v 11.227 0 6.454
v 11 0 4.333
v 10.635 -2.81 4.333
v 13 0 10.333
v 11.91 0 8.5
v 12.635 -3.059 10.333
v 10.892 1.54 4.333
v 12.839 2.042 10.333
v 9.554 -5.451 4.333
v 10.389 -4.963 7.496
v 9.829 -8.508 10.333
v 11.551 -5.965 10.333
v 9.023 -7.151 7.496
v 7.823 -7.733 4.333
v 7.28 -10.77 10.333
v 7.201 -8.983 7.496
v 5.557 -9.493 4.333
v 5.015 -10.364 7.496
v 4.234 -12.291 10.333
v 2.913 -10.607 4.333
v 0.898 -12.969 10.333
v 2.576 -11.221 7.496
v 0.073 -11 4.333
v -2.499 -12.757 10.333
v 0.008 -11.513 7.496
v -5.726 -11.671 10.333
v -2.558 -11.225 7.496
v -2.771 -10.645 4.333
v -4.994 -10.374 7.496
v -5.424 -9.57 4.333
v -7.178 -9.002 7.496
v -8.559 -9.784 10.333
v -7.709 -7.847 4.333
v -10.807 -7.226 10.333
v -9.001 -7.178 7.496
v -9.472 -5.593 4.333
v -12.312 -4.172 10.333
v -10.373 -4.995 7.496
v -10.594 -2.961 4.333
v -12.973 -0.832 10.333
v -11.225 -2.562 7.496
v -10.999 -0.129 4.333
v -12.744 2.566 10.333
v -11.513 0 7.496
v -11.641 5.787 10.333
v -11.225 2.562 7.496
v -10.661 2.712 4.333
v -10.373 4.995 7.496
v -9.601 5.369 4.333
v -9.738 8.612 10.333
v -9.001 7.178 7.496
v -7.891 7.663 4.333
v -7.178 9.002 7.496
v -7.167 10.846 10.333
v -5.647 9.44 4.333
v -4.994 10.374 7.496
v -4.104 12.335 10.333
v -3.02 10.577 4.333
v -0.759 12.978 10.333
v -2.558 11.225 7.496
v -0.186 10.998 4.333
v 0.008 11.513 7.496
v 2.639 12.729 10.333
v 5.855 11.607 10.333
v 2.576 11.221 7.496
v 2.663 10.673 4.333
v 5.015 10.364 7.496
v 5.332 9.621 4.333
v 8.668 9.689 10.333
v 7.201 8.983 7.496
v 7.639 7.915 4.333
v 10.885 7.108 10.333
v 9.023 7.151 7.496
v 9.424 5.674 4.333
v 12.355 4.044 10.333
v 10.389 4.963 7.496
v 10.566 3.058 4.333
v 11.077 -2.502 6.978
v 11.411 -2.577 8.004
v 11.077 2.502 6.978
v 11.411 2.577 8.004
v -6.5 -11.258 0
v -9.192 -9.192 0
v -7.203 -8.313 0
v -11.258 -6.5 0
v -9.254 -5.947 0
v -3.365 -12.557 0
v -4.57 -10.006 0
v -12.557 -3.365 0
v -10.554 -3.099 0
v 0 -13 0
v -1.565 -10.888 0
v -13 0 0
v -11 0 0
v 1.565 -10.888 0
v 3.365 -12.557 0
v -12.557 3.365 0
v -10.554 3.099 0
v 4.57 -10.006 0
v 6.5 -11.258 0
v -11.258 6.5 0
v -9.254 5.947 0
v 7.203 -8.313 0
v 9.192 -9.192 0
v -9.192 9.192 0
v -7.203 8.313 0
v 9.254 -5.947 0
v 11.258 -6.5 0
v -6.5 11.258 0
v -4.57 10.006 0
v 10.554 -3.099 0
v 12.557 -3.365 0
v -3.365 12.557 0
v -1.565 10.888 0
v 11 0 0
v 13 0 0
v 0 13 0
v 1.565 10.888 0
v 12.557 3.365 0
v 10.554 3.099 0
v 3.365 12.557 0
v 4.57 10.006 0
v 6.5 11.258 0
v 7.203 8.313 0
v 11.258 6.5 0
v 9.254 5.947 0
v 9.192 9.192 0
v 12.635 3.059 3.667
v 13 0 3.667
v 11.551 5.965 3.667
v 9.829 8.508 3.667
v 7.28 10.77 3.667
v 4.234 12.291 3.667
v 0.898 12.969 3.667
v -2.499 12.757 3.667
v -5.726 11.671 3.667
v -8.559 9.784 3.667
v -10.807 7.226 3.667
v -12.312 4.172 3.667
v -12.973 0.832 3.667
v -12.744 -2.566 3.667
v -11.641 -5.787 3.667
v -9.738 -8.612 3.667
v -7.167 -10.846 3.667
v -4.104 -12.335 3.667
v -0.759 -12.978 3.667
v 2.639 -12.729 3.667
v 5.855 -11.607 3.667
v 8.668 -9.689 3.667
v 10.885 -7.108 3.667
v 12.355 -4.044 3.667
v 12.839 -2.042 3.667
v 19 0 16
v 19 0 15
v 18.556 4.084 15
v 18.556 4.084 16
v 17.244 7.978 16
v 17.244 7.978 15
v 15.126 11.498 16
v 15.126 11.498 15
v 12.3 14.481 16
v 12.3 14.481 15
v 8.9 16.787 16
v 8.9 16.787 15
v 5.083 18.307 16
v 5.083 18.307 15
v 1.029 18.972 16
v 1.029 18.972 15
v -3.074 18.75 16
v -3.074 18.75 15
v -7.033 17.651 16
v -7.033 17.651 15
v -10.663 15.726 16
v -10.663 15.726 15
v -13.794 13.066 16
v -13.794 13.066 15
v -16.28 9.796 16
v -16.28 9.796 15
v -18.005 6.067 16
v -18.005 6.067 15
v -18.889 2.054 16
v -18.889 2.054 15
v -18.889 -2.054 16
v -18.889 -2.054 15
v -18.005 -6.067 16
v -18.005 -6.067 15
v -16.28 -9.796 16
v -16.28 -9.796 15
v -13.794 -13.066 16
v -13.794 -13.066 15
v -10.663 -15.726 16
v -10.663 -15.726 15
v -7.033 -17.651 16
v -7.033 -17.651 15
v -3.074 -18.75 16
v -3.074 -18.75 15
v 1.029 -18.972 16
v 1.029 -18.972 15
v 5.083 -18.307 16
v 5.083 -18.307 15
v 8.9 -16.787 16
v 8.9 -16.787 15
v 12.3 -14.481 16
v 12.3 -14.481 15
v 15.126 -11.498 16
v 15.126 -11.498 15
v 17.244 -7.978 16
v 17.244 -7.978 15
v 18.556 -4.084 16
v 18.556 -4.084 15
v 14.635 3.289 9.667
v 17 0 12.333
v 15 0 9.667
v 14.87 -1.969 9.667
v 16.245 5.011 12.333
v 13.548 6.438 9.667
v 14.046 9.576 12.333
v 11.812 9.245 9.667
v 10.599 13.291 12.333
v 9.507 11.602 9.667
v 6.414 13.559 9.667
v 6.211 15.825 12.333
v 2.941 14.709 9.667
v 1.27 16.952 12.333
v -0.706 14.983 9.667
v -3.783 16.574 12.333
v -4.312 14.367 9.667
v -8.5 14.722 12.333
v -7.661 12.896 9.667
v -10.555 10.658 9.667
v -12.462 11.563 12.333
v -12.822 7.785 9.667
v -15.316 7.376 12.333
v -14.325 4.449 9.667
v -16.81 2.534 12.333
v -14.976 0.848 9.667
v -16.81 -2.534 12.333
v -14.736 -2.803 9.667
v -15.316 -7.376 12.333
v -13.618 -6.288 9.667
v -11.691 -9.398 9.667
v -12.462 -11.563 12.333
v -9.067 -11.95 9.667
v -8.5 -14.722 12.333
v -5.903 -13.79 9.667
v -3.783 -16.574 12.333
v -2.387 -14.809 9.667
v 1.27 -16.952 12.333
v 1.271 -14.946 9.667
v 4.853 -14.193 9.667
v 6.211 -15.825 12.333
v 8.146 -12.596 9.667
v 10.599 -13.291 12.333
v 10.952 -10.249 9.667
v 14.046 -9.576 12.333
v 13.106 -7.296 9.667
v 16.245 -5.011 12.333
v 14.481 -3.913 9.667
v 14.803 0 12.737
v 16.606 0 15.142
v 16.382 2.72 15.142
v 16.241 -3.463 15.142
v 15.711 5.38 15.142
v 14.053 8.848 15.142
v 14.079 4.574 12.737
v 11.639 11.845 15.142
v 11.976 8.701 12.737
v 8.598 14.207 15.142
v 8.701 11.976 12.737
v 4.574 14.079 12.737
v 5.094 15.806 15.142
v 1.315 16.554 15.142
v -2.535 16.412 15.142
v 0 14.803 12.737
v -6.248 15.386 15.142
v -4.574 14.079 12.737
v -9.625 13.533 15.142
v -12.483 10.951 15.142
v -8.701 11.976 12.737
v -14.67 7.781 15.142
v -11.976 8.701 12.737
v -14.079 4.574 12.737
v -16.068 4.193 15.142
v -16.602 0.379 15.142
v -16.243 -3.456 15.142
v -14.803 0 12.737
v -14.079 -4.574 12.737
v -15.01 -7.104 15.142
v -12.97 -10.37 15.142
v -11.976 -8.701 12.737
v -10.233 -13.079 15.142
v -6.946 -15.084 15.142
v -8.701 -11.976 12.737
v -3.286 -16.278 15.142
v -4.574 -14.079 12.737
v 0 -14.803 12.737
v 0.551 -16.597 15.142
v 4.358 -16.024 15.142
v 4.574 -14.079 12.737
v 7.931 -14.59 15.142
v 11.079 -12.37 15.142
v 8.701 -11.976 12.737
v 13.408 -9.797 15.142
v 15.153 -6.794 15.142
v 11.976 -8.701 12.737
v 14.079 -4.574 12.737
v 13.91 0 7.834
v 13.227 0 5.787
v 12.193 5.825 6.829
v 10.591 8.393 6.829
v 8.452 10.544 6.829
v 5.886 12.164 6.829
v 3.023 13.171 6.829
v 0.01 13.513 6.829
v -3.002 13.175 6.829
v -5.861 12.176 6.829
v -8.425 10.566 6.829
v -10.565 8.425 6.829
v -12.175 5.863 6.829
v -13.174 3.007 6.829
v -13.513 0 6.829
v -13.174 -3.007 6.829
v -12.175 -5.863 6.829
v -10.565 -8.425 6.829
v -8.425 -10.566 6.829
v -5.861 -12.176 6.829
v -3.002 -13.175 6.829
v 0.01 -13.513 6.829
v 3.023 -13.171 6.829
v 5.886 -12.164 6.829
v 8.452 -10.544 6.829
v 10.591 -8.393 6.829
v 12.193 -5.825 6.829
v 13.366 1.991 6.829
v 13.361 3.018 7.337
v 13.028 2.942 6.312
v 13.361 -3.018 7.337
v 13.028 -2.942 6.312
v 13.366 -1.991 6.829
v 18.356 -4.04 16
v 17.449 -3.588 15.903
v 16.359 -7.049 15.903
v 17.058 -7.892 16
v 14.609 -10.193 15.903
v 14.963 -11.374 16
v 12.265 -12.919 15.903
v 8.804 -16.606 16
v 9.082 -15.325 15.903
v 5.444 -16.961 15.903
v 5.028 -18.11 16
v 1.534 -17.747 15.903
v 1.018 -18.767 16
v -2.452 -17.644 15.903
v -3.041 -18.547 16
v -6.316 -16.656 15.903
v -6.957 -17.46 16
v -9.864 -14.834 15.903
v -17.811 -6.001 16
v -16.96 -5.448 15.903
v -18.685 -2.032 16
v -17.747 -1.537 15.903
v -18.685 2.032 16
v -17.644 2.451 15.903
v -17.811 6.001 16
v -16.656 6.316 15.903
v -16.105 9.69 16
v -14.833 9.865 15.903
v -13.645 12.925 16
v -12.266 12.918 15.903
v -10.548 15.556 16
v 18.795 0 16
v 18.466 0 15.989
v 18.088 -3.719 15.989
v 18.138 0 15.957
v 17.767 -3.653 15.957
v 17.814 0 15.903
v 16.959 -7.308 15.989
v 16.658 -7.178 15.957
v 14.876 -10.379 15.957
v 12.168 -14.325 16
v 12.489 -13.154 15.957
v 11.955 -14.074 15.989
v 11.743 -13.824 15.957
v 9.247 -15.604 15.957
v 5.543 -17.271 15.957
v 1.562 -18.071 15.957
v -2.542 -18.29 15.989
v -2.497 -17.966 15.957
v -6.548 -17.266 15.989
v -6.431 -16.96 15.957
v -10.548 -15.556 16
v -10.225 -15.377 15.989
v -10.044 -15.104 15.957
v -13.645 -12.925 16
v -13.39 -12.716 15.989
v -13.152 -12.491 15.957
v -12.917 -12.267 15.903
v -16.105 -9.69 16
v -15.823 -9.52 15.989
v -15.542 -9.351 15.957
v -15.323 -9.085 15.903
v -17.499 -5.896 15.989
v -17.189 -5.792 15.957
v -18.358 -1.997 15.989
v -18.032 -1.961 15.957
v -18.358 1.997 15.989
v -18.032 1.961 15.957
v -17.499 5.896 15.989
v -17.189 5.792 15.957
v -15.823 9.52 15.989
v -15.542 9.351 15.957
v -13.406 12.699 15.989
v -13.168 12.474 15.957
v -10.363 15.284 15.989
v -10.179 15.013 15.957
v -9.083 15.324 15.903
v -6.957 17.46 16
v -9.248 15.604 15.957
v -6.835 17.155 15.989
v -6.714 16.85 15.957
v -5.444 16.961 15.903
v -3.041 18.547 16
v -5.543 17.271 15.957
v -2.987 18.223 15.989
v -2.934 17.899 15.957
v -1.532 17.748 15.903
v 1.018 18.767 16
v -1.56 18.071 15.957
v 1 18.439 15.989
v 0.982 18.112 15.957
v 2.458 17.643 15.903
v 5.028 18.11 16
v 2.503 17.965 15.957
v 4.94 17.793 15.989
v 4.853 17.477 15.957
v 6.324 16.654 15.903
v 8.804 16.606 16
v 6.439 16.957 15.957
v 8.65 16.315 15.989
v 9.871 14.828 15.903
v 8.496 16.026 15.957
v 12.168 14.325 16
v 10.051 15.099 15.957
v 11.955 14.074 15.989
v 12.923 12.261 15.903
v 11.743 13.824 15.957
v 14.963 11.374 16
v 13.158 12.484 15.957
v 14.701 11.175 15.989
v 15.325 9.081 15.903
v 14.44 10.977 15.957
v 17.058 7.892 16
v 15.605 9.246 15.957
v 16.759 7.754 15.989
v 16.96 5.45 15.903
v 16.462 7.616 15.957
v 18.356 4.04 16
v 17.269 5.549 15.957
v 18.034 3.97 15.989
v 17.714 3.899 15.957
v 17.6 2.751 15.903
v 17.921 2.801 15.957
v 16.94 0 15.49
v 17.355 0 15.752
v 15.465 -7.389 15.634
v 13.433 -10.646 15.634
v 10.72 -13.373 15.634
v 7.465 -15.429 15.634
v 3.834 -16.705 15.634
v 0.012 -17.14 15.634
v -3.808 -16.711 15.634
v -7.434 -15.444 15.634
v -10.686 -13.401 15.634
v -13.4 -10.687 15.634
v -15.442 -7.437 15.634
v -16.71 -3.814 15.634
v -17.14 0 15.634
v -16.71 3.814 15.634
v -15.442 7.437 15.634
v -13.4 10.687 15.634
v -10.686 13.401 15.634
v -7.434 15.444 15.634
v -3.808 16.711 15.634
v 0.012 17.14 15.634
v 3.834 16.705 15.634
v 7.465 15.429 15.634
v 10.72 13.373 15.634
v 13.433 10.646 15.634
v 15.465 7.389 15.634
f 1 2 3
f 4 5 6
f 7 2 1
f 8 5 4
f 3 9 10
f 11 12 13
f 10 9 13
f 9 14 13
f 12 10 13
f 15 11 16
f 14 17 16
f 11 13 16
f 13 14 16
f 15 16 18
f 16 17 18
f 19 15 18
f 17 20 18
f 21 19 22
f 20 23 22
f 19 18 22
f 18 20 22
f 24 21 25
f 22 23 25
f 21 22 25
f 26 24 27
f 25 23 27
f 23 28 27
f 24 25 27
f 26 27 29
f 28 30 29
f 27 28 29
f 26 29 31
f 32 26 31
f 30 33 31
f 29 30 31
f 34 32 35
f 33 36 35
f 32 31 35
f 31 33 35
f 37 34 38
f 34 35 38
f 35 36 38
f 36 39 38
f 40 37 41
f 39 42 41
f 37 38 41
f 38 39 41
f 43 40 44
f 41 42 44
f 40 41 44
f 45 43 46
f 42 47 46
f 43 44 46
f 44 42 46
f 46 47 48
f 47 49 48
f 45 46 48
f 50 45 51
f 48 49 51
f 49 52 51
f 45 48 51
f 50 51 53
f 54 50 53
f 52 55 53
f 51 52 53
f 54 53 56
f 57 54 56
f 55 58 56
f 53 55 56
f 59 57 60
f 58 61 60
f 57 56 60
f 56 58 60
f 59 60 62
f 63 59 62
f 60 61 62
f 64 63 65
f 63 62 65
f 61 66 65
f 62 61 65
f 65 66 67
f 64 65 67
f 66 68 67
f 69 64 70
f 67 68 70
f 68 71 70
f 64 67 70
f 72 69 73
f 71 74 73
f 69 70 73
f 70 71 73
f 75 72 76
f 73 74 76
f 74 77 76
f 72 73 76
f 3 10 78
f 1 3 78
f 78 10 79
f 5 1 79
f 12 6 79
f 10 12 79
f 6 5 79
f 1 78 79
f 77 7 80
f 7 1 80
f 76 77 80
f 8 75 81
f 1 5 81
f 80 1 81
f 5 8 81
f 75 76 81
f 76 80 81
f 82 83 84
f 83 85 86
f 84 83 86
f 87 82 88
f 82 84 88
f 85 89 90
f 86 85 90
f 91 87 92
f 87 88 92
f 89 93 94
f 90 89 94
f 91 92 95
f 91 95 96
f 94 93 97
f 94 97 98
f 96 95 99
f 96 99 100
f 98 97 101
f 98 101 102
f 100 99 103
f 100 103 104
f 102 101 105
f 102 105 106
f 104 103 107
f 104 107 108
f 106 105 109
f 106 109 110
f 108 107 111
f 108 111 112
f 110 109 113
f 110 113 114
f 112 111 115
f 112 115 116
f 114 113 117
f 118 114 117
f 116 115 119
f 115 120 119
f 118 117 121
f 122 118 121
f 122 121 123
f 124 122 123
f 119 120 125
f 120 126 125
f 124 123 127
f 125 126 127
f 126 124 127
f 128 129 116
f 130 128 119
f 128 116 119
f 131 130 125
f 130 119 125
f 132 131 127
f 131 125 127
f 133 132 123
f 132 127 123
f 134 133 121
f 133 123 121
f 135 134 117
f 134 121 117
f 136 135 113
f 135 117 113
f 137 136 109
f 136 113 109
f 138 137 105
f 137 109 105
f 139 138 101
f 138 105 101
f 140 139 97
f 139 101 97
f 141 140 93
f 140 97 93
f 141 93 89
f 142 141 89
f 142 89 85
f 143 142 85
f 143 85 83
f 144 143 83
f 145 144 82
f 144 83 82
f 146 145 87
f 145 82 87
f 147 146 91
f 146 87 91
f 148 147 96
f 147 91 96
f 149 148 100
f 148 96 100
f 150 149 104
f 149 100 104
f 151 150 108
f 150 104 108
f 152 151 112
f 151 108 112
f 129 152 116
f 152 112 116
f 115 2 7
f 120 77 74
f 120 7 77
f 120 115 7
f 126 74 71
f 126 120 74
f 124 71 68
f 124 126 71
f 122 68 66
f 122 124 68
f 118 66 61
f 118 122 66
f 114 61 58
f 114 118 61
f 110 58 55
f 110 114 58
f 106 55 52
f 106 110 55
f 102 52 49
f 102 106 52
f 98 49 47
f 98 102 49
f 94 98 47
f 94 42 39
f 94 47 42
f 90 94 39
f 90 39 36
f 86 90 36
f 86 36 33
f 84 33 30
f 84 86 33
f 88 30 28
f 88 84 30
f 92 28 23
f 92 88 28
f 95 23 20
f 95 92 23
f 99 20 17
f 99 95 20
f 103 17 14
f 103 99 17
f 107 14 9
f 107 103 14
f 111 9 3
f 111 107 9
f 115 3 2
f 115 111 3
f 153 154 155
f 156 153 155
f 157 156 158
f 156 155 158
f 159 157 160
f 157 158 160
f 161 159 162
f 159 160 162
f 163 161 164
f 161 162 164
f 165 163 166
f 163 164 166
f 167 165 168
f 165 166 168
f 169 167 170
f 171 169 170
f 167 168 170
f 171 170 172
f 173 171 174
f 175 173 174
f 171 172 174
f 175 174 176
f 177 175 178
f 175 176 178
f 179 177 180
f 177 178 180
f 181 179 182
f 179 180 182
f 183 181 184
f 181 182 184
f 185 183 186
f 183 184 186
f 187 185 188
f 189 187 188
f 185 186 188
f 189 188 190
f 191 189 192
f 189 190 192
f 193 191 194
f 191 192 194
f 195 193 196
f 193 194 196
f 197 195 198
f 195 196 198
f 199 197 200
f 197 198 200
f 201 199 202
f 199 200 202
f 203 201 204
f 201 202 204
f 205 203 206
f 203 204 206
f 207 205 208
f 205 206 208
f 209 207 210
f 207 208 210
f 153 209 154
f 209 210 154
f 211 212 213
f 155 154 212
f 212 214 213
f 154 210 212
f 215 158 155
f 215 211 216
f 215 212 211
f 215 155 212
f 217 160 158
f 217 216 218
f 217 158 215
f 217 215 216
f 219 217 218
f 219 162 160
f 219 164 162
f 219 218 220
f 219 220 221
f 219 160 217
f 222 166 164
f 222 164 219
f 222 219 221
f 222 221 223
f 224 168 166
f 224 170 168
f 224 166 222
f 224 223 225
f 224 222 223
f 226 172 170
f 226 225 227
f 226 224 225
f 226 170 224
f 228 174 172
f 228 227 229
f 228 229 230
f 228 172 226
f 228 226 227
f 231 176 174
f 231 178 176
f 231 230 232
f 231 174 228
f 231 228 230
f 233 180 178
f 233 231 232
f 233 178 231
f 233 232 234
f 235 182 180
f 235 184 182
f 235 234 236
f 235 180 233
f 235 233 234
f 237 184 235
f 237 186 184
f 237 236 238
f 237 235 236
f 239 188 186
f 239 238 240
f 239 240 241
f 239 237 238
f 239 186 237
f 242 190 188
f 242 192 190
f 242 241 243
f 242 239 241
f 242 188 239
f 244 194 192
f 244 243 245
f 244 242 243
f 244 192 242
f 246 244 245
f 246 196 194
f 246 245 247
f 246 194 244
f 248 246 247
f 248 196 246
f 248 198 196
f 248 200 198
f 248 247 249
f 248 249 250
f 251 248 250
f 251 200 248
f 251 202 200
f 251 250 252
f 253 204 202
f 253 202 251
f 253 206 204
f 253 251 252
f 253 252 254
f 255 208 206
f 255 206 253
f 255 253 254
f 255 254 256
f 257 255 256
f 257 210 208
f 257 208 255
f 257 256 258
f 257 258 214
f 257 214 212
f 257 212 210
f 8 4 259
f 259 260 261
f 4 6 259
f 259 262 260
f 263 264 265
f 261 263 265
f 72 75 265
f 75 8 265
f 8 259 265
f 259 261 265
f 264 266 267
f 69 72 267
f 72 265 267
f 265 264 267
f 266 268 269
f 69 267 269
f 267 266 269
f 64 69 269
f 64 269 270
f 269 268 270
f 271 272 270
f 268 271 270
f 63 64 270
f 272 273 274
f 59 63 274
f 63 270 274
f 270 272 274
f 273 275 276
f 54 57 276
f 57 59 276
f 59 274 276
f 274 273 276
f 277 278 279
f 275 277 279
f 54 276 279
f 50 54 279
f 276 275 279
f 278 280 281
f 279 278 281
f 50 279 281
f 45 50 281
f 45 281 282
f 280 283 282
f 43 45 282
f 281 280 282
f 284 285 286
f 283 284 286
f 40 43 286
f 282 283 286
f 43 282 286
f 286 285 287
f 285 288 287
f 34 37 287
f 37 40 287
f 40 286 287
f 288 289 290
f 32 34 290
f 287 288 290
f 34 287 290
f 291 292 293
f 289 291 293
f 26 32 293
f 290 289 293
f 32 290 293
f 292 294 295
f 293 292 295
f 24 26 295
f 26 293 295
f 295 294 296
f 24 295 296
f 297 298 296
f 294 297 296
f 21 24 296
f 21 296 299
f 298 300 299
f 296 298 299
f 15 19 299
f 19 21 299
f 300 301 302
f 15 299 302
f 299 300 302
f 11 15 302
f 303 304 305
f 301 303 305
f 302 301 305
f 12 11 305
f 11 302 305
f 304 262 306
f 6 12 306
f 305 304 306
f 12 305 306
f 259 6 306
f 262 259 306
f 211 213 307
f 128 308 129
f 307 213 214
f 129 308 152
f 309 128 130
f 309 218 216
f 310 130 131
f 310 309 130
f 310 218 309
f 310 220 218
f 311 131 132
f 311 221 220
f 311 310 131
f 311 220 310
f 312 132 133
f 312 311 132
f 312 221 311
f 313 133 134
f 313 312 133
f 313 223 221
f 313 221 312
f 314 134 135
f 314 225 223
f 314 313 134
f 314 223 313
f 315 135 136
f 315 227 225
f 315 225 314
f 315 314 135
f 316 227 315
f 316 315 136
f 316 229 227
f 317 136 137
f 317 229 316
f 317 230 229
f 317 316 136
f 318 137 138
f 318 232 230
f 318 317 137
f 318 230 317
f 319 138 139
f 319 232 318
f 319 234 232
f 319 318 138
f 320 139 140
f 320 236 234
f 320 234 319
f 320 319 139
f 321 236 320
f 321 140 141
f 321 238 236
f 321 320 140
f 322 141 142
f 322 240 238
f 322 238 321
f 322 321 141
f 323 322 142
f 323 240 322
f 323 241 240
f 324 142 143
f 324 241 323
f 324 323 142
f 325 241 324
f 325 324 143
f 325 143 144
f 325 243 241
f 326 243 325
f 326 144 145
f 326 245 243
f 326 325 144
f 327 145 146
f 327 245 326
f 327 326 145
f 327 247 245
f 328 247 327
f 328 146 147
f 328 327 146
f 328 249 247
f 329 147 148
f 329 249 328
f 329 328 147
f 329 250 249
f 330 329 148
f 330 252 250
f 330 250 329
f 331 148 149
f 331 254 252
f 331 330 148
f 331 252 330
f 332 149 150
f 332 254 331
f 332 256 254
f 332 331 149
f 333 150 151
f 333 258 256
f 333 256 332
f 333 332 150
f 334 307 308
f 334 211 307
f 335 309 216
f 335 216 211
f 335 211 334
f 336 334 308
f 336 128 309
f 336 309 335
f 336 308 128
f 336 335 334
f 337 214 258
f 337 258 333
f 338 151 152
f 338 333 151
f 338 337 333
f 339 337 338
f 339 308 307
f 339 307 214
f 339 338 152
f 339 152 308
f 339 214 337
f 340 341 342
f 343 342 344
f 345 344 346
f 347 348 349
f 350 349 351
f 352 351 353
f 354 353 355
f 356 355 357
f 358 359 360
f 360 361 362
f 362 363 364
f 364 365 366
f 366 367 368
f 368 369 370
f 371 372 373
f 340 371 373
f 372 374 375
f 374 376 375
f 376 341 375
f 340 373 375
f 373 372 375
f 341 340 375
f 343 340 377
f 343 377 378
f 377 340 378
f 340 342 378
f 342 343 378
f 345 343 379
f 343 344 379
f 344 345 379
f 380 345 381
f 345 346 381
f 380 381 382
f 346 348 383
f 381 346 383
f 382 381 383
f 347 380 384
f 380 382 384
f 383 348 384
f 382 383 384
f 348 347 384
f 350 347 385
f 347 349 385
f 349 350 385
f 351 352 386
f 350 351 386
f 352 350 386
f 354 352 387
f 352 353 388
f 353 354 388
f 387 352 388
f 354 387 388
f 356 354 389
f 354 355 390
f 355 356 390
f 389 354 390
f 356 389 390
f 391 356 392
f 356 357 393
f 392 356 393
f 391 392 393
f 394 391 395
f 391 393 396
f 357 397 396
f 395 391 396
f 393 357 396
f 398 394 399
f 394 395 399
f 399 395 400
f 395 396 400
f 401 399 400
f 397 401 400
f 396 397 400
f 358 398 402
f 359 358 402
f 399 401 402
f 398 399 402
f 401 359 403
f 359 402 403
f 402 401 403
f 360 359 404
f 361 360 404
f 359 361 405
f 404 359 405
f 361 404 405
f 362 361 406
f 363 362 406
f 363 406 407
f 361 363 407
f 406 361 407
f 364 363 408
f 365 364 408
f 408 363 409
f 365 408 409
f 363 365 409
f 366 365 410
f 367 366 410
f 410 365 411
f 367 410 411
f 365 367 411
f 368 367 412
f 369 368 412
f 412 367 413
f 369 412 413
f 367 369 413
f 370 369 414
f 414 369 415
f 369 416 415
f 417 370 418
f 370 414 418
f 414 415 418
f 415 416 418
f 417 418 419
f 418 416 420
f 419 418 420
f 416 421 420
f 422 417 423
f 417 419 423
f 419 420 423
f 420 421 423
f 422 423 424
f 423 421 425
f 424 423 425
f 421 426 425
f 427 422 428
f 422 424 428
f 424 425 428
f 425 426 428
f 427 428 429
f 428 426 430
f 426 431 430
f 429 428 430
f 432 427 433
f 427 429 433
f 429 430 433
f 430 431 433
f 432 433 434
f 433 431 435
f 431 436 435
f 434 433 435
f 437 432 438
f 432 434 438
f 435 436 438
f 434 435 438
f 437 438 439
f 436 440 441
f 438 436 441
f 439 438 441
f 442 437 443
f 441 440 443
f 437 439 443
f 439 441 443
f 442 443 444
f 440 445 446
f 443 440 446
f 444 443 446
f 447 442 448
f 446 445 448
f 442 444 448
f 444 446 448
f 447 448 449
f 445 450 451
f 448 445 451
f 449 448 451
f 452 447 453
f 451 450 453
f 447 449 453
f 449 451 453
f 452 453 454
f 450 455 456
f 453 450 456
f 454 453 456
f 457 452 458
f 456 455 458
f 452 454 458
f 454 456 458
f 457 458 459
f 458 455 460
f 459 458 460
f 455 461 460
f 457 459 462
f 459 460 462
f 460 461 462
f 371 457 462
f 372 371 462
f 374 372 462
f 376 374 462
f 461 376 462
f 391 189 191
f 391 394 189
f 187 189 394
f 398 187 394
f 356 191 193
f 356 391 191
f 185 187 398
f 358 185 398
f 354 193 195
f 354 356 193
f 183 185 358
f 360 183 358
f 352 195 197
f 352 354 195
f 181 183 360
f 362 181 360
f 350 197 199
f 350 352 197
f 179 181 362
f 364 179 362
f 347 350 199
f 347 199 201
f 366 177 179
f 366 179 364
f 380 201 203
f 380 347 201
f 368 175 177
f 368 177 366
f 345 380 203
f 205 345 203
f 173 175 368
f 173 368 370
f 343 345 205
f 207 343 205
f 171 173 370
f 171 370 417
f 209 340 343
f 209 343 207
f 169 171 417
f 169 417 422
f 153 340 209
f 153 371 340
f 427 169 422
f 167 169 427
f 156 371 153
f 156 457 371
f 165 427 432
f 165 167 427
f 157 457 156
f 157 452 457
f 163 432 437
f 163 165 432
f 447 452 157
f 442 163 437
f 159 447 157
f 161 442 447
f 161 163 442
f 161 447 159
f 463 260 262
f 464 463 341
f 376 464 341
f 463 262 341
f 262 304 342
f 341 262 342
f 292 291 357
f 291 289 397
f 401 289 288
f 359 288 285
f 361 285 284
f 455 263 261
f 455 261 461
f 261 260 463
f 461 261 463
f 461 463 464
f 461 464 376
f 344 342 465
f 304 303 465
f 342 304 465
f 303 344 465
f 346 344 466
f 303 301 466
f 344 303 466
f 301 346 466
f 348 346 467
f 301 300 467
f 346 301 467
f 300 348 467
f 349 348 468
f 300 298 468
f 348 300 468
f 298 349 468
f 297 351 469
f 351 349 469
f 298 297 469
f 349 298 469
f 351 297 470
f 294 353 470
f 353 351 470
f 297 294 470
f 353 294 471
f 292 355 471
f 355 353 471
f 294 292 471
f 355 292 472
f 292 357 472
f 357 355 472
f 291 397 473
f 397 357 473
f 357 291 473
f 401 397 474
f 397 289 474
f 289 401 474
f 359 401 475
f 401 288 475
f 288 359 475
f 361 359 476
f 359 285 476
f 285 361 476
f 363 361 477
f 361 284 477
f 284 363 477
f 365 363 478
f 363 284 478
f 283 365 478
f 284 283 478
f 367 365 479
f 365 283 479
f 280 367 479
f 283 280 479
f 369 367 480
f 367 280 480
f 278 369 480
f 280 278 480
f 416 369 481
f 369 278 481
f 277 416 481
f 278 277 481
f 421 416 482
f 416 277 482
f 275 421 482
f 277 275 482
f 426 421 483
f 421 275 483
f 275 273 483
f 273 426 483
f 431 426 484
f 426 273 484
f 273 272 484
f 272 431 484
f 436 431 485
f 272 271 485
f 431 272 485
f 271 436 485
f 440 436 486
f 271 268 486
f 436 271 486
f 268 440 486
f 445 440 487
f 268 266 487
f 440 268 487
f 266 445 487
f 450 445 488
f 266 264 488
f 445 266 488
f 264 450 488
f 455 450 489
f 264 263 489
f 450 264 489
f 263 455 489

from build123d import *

# Parameters (mm, degrees)
F0_R      = 13
F3_DEPTH  = 7
F2_R      = 19
F4_DEPTH  = 1
F3_FACE_R = 13
F4_FACE_R = 19
F6_T      = -2
F7_R      = 10
F9_R      = 10
F10_R     = 2


# Not quite as in the source:
# - a fillet or chamfer that OpenCascade refuses, or shapes differently, is made with other operations: its cross-section is extruded or revolved along the edge and cut away or added


with BuildPart() as f3:
    # F0 (on Top) → F3 (new body)
    with BuildSketch(Plane.XY):
        Circle(F0_R)
    extrude(amount=F3_DEPTH)



with BuildPart() as f4:
    # F2 (on offset) → F4 (new body)
    with BuildSketch(Plane.XY.offset(15)):
        Circle(F2_R)
    extrude(amount=F4_DEPTH)


with BuildPart() as f3_1:
    add(f3.part)

    add(f4.part)  # F5 merges F4
    # F3_face (on face) → F5 section 0
    with BuildSketch(Plane.XY.offset(7)):
        Circle(F3_FACE_R)
    # F4_face (on face) → F5 section 1
    with BuildSketch(Plane(origin=(0, 0, 15), x_dir=(1, 0, 0), z_dir=(0, 0, -1))):
        Circle(F4_FACE_R)
    loft()

    # F6
    f6_openings = [f3_1.faces().sort_by_distance(p)[0] for p in [
        (0, 0, 16),
        (0, 0, 0),
    ]]
    offset(amount=F6_T, openings=f6_openings, kind=Kind.INTERSECTION)

    # F7
    f7_edges = [f3_1.edges().sort_by_distance(p)[0] for p in [
        (-13, 0, 7),
    ]]
    fillet(f7_edges, radius=F7_R)

    # F8: fillet of radius 5 on 2 edges, made by hand

    # F8_s1 → F8_t2 (revolve, cut)
    with BuildSketch(Plane.XZ):
        with BuildLine():
            ThreePointArc((18.7950549357, 16), (17.8821840065, 15.9159604013), (17, 15.6666666667))
            Line((17, 15.6666666667), (17, 16))
            Line((17, 16), (18.7950549357, 16))
        make_face()
    revolve(axis=Axis((0, 0, 16), (0, 0, -1)), mode=Mode.SUBTRACT)

    # F9
    f9_edges = [f3_1.edges().sort_by_distance(p)[0] for p in [
        (-11, 0, 7.666667),
    ]]
    fillet(f9_edges, radius=F9_R)

    # F10
    f10_edges = [f3_1.edges().sort_by_distance(p)[0] for p in [
        (-17, 0, 15.666667),
    ]]
    fillet(f10_edges, radius=F10_R)


solid = f3_1.part
